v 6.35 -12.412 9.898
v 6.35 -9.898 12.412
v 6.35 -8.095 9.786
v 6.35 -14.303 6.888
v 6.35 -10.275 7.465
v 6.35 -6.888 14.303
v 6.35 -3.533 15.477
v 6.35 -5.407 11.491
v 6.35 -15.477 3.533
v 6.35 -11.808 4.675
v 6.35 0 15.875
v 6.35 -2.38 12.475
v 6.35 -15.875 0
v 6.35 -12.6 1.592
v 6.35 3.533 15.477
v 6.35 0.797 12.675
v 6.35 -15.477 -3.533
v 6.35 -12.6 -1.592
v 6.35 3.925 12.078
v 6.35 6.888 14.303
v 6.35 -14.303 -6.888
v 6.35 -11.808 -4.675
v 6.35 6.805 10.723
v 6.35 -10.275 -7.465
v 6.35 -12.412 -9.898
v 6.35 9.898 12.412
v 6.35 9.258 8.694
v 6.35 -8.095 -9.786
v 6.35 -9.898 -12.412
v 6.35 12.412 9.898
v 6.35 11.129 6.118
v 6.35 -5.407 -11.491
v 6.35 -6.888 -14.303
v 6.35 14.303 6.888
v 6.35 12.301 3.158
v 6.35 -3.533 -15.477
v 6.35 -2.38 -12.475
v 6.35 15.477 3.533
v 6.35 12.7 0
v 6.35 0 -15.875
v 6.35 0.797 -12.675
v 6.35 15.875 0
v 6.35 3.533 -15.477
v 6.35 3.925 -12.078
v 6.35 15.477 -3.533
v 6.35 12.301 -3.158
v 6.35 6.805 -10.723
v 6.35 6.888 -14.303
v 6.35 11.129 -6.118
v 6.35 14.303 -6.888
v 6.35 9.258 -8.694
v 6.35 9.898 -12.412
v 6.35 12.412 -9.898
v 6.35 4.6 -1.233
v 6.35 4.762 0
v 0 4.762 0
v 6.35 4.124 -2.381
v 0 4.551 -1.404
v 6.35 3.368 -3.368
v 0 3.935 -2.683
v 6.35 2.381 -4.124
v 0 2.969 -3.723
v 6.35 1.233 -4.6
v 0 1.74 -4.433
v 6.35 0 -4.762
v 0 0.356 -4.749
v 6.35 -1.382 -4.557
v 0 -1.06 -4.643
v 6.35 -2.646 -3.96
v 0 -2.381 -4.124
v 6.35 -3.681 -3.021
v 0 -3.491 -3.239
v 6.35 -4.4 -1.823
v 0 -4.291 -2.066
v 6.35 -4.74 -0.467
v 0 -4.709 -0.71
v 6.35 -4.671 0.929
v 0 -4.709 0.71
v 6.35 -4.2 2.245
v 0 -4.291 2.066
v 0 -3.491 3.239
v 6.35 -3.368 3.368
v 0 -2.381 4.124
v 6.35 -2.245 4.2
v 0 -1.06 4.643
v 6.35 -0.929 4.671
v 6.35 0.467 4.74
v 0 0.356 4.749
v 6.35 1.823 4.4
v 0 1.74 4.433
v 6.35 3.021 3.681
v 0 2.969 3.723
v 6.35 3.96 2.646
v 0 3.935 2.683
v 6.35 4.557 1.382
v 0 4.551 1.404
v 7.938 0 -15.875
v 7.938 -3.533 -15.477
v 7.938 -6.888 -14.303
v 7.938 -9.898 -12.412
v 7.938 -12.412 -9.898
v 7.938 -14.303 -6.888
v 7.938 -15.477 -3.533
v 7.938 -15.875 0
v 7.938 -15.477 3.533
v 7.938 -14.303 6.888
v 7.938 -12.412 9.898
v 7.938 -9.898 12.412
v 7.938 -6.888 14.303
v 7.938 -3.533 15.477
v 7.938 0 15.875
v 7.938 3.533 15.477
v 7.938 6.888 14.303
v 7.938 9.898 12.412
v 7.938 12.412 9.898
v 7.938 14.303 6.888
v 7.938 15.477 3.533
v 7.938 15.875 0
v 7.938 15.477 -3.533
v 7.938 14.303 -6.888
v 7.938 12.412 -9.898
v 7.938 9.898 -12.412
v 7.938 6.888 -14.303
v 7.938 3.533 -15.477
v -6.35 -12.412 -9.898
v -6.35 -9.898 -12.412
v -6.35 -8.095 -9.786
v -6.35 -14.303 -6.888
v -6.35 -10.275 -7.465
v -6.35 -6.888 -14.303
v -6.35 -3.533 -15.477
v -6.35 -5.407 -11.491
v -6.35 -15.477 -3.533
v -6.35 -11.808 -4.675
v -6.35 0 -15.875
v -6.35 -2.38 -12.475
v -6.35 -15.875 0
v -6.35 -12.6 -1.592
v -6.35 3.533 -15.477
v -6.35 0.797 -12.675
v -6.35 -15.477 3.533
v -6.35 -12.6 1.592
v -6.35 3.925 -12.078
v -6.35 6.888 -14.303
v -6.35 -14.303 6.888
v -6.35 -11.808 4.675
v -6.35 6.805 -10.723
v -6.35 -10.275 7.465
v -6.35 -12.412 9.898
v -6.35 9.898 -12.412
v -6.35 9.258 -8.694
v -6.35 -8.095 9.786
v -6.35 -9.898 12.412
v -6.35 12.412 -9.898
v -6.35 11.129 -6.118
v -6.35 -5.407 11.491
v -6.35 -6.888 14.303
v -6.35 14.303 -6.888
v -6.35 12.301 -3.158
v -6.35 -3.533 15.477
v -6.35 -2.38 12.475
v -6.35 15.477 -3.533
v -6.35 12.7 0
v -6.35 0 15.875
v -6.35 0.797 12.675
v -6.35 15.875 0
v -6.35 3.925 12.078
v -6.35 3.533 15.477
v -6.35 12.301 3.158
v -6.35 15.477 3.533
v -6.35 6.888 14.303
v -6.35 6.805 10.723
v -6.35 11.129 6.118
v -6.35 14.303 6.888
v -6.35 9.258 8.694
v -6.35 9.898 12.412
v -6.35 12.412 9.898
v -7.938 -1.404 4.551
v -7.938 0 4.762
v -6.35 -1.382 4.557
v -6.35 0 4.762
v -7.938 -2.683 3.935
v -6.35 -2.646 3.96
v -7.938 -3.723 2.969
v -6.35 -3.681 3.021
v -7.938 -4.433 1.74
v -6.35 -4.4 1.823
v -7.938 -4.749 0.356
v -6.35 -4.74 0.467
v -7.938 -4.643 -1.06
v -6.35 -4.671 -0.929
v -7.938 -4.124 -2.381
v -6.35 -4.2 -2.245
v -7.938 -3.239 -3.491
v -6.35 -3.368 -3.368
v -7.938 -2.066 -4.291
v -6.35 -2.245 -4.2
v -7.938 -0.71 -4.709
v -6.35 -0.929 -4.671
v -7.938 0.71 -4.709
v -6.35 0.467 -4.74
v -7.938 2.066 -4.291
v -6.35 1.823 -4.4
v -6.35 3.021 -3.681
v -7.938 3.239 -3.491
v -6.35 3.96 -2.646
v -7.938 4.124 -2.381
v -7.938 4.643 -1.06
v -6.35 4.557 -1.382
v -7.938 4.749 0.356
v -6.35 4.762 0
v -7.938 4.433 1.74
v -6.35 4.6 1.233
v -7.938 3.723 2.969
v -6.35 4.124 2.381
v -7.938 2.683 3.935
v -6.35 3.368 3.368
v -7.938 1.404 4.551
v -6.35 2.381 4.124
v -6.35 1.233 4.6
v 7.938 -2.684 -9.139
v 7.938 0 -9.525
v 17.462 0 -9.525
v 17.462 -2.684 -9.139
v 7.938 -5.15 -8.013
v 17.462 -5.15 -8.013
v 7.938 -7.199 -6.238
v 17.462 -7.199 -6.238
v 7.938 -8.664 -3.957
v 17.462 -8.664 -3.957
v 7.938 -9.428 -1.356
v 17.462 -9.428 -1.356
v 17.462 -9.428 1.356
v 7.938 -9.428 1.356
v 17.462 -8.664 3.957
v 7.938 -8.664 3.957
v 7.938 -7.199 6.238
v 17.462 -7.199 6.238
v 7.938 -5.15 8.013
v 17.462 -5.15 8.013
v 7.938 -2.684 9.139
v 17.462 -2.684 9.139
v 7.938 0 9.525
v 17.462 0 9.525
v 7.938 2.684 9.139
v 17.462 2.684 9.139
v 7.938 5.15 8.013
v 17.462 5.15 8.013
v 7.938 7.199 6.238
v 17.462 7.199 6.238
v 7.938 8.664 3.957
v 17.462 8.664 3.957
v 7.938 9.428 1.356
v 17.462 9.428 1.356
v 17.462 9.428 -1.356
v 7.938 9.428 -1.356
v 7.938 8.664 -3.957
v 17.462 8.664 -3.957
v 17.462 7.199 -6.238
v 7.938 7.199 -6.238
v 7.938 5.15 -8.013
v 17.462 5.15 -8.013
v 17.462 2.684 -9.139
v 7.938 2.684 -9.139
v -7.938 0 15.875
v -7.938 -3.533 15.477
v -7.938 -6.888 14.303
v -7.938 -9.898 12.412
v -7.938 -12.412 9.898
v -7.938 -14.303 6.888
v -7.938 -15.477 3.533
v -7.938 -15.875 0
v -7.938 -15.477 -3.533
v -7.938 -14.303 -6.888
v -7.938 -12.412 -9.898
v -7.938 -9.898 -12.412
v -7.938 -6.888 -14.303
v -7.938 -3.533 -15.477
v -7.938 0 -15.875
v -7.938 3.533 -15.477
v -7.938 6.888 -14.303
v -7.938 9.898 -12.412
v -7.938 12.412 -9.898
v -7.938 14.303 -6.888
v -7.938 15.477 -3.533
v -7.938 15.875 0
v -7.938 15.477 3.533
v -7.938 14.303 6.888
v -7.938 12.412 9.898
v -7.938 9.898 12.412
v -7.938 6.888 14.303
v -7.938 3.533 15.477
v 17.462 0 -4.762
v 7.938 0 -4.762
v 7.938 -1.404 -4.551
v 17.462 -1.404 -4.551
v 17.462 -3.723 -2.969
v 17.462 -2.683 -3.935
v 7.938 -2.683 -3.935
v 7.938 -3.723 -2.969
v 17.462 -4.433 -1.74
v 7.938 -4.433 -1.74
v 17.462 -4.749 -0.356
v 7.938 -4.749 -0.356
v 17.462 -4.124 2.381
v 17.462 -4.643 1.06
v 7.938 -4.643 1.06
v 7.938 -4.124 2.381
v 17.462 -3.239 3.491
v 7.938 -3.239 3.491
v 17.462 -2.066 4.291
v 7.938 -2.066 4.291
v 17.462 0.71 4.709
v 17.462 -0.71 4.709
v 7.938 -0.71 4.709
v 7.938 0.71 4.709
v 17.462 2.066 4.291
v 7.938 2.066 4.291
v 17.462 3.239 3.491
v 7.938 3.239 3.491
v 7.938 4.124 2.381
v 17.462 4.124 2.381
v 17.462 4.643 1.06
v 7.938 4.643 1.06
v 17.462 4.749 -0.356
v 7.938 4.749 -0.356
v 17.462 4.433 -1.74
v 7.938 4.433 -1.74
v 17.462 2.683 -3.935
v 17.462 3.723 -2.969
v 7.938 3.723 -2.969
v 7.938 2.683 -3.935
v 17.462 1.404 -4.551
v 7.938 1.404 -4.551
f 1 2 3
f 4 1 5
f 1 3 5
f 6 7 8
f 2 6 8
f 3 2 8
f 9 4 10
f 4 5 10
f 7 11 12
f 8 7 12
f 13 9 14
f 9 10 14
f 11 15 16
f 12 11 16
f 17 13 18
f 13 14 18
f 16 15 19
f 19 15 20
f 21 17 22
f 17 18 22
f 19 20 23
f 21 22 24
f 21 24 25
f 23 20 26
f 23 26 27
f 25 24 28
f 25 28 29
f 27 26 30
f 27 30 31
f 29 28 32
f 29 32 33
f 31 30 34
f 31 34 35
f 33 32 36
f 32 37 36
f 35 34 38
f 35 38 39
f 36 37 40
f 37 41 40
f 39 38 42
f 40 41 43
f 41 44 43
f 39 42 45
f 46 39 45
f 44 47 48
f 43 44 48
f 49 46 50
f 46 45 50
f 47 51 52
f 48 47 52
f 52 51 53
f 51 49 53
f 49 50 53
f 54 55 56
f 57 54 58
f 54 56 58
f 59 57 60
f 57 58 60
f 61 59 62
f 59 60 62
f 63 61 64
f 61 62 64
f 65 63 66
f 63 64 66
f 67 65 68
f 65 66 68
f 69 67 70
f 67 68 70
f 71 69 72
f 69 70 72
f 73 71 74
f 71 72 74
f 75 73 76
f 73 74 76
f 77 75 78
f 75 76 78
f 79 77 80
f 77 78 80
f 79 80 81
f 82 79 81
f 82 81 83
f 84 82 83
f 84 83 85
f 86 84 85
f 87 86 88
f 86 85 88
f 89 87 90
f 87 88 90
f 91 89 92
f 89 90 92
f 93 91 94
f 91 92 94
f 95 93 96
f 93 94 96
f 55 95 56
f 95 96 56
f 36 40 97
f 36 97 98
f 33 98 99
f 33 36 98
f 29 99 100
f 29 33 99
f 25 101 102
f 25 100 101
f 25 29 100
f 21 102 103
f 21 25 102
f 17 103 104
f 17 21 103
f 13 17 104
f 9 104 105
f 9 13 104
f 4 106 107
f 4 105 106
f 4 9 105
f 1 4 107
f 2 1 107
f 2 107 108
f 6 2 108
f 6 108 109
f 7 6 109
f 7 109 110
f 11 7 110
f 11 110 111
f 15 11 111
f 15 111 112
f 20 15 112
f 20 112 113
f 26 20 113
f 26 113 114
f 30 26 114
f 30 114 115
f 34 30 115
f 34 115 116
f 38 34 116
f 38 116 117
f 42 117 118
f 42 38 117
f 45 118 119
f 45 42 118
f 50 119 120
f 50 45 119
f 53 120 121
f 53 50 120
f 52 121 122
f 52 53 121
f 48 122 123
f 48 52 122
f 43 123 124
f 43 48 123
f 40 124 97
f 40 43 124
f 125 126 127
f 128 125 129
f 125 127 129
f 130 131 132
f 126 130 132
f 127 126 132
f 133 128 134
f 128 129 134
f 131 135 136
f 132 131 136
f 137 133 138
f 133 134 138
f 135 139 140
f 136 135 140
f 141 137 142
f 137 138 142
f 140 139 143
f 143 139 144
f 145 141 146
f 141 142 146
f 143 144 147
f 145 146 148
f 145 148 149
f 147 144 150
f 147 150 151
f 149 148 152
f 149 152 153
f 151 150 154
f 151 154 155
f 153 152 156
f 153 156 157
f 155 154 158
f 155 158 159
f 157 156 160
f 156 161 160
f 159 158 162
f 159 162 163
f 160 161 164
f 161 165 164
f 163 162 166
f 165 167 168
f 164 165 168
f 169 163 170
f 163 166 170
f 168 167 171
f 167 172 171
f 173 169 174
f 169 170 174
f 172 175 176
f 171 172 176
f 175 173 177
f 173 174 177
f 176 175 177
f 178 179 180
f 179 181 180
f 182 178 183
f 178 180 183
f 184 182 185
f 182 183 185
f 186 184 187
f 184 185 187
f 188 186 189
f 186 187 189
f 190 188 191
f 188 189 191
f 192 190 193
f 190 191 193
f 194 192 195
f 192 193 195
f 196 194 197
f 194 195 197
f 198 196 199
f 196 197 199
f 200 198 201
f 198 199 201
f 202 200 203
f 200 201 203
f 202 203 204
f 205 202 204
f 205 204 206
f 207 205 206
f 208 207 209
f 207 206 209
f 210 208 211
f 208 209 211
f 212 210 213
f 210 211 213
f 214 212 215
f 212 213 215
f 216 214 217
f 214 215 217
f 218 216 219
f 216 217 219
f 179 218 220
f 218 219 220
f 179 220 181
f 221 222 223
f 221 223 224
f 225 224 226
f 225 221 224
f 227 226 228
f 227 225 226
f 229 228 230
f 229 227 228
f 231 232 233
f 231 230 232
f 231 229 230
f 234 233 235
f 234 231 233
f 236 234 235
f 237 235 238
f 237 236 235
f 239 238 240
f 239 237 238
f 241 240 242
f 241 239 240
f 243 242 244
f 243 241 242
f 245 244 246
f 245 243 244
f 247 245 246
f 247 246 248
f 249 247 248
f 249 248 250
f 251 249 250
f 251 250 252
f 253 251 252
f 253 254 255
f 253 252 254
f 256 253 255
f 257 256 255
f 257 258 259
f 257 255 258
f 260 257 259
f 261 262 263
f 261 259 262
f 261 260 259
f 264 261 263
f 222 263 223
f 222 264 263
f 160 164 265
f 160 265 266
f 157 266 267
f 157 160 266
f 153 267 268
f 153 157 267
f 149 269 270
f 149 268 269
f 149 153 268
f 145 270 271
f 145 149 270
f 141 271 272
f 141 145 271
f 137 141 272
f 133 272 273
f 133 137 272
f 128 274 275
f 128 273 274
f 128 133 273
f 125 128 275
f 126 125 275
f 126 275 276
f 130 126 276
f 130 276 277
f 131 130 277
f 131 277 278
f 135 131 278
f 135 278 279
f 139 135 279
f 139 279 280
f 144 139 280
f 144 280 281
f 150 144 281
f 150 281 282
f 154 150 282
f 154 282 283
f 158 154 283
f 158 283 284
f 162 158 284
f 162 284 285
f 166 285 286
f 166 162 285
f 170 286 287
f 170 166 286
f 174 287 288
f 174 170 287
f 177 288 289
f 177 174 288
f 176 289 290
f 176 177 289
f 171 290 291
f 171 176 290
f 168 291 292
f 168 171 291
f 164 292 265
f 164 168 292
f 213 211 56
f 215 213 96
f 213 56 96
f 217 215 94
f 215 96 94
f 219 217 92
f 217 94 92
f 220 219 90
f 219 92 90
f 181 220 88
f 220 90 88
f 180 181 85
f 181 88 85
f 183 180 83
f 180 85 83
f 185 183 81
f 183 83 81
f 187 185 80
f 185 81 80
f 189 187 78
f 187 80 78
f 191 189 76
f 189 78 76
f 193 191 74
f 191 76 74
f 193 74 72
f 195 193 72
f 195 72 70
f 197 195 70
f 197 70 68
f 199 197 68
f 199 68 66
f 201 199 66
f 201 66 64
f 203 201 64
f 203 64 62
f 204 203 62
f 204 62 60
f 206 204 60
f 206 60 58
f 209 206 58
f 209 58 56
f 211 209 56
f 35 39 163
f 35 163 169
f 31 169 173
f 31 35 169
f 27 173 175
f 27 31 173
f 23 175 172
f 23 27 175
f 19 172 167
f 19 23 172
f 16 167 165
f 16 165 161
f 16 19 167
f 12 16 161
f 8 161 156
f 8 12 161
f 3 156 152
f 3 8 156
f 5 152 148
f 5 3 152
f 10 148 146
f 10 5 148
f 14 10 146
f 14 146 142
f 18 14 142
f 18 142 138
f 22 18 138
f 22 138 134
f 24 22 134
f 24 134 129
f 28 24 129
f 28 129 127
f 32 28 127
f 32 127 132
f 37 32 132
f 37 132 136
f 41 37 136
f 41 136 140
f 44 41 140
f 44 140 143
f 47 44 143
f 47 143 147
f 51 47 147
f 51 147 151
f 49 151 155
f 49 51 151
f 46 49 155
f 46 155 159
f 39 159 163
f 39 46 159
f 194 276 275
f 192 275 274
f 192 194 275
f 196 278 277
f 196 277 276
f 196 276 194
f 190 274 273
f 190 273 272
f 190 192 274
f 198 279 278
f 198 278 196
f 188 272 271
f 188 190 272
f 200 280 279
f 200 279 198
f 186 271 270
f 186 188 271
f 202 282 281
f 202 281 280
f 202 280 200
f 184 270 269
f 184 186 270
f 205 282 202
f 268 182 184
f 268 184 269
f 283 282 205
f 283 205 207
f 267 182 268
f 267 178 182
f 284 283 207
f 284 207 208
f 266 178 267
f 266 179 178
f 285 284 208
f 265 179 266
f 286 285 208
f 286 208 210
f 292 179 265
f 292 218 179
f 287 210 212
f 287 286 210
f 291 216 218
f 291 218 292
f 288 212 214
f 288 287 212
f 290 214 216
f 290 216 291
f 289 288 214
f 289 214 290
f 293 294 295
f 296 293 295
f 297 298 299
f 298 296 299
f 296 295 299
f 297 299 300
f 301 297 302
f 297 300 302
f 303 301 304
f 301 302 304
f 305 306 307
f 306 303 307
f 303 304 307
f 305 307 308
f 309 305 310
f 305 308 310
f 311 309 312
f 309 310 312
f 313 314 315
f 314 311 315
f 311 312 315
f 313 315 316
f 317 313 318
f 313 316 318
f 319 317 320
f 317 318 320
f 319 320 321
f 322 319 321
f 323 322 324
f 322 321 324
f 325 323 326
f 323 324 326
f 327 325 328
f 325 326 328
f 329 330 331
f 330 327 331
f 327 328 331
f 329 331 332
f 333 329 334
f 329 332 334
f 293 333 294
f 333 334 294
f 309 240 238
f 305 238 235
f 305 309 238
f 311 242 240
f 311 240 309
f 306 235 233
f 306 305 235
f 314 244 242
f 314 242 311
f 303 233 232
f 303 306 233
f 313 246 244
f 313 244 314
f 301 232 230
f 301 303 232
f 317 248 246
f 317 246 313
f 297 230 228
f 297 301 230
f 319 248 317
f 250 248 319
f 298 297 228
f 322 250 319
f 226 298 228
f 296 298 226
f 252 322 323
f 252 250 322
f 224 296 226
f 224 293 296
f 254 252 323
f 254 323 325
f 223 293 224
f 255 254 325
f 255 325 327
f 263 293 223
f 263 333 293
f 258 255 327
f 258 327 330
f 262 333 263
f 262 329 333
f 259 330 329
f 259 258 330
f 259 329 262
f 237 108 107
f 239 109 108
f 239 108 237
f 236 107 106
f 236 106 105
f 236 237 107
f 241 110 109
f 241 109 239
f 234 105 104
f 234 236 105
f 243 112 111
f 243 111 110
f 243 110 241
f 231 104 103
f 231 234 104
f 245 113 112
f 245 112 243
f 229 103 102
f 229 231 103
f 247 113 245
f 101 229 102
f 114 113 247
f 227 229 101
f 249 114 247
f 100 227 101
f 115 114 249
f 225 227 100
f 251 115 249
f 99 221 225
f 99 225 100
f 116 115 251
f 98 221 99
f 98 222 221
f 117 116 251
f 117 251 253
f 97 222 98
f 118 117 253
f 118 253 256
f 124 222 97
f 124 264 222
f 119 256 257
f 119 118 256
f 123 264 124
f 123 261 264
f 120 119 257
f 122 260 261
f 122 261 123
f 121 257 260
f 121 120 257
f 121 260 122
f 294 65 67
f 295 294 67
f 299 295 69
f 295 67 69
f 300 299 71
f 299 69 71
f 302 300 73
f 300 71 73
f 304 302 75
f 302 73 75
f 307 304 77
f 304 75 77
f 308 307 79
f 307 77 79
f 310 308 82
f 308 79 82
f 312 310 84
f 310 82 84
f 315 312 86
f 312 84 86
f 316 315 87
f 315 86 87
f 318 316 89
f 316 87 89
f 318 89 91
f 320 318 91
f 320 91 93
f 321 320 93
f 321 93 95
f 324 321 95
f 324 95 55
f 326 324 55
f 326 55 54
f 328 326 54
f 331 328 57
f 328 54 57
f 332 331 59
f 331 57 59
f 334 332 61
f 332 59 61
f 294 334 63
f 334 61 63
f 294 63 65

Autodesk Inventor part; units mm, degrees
ref_plane "YZ Plane" through (0, 0, 0) normal (1, 0, 0) x (0, 1, 0)
ref_plane "XZ Plane" through (0, 0, 0) normal (0, 1, 0) x (-1, 0, 0)
ref_plane "XY Plane" through (0, 0, 0) normal (0, 0, 1) x (1, 0, 0)
sketch "Sketch1" plane through (0, 0, 0) normal (1, 0, 0) x (0, 1, 0)
  circle A0 centre (0, 0) radius 12.7
  circle A1 centre (0, 0) radius 4.7625
  dimension "d0" = 25.4
  dimension "d2" = 9.525
extrude "Extrusion1" add sketch "Sketch1" along normal mid plane 12.7
sketch "Sketch2" plane through (6.35, 0, 0) normal (1, 0, 0) x (0, 0, -1)
  circle A0 centre (0, 0) radius 15.875
  circle A1 centre (0, 0) radius 12.7 construction
  circle A2 centre (0, 0) radius 4.7625 projected
  dimension "d6" = 3.175
extrude "Extrusion2" add sketch "Sketch2" along normal blind 1.5875
sketch "Sketch3" plane through (-6.35, 0, 0) normal (-1, 0, 0) x (0, 0, 1)
  circle A0 centre (0, 0) radius 15.875 projected
  circle A1 centre (0, 0) radius 4.7625 projected
extrude "Extrusion3" add sketch "Sketch3" along normal blind 1.5875
sketch "Sketch4" plane through (7.9375, 0, 0) normal (1, 0, 0) x (0, 0, -1)
  circle A0 centre (0, 0) radius 4.7625 projected
  circle A1 centre (0, 0) radius 9.525
  dimension "d11" = 4.7625
extrude "Extrusion4" add sketch "Sketch4" along normal blind 9.525
properties part number "pulley XL 1in" material "Aluminum 6061"
